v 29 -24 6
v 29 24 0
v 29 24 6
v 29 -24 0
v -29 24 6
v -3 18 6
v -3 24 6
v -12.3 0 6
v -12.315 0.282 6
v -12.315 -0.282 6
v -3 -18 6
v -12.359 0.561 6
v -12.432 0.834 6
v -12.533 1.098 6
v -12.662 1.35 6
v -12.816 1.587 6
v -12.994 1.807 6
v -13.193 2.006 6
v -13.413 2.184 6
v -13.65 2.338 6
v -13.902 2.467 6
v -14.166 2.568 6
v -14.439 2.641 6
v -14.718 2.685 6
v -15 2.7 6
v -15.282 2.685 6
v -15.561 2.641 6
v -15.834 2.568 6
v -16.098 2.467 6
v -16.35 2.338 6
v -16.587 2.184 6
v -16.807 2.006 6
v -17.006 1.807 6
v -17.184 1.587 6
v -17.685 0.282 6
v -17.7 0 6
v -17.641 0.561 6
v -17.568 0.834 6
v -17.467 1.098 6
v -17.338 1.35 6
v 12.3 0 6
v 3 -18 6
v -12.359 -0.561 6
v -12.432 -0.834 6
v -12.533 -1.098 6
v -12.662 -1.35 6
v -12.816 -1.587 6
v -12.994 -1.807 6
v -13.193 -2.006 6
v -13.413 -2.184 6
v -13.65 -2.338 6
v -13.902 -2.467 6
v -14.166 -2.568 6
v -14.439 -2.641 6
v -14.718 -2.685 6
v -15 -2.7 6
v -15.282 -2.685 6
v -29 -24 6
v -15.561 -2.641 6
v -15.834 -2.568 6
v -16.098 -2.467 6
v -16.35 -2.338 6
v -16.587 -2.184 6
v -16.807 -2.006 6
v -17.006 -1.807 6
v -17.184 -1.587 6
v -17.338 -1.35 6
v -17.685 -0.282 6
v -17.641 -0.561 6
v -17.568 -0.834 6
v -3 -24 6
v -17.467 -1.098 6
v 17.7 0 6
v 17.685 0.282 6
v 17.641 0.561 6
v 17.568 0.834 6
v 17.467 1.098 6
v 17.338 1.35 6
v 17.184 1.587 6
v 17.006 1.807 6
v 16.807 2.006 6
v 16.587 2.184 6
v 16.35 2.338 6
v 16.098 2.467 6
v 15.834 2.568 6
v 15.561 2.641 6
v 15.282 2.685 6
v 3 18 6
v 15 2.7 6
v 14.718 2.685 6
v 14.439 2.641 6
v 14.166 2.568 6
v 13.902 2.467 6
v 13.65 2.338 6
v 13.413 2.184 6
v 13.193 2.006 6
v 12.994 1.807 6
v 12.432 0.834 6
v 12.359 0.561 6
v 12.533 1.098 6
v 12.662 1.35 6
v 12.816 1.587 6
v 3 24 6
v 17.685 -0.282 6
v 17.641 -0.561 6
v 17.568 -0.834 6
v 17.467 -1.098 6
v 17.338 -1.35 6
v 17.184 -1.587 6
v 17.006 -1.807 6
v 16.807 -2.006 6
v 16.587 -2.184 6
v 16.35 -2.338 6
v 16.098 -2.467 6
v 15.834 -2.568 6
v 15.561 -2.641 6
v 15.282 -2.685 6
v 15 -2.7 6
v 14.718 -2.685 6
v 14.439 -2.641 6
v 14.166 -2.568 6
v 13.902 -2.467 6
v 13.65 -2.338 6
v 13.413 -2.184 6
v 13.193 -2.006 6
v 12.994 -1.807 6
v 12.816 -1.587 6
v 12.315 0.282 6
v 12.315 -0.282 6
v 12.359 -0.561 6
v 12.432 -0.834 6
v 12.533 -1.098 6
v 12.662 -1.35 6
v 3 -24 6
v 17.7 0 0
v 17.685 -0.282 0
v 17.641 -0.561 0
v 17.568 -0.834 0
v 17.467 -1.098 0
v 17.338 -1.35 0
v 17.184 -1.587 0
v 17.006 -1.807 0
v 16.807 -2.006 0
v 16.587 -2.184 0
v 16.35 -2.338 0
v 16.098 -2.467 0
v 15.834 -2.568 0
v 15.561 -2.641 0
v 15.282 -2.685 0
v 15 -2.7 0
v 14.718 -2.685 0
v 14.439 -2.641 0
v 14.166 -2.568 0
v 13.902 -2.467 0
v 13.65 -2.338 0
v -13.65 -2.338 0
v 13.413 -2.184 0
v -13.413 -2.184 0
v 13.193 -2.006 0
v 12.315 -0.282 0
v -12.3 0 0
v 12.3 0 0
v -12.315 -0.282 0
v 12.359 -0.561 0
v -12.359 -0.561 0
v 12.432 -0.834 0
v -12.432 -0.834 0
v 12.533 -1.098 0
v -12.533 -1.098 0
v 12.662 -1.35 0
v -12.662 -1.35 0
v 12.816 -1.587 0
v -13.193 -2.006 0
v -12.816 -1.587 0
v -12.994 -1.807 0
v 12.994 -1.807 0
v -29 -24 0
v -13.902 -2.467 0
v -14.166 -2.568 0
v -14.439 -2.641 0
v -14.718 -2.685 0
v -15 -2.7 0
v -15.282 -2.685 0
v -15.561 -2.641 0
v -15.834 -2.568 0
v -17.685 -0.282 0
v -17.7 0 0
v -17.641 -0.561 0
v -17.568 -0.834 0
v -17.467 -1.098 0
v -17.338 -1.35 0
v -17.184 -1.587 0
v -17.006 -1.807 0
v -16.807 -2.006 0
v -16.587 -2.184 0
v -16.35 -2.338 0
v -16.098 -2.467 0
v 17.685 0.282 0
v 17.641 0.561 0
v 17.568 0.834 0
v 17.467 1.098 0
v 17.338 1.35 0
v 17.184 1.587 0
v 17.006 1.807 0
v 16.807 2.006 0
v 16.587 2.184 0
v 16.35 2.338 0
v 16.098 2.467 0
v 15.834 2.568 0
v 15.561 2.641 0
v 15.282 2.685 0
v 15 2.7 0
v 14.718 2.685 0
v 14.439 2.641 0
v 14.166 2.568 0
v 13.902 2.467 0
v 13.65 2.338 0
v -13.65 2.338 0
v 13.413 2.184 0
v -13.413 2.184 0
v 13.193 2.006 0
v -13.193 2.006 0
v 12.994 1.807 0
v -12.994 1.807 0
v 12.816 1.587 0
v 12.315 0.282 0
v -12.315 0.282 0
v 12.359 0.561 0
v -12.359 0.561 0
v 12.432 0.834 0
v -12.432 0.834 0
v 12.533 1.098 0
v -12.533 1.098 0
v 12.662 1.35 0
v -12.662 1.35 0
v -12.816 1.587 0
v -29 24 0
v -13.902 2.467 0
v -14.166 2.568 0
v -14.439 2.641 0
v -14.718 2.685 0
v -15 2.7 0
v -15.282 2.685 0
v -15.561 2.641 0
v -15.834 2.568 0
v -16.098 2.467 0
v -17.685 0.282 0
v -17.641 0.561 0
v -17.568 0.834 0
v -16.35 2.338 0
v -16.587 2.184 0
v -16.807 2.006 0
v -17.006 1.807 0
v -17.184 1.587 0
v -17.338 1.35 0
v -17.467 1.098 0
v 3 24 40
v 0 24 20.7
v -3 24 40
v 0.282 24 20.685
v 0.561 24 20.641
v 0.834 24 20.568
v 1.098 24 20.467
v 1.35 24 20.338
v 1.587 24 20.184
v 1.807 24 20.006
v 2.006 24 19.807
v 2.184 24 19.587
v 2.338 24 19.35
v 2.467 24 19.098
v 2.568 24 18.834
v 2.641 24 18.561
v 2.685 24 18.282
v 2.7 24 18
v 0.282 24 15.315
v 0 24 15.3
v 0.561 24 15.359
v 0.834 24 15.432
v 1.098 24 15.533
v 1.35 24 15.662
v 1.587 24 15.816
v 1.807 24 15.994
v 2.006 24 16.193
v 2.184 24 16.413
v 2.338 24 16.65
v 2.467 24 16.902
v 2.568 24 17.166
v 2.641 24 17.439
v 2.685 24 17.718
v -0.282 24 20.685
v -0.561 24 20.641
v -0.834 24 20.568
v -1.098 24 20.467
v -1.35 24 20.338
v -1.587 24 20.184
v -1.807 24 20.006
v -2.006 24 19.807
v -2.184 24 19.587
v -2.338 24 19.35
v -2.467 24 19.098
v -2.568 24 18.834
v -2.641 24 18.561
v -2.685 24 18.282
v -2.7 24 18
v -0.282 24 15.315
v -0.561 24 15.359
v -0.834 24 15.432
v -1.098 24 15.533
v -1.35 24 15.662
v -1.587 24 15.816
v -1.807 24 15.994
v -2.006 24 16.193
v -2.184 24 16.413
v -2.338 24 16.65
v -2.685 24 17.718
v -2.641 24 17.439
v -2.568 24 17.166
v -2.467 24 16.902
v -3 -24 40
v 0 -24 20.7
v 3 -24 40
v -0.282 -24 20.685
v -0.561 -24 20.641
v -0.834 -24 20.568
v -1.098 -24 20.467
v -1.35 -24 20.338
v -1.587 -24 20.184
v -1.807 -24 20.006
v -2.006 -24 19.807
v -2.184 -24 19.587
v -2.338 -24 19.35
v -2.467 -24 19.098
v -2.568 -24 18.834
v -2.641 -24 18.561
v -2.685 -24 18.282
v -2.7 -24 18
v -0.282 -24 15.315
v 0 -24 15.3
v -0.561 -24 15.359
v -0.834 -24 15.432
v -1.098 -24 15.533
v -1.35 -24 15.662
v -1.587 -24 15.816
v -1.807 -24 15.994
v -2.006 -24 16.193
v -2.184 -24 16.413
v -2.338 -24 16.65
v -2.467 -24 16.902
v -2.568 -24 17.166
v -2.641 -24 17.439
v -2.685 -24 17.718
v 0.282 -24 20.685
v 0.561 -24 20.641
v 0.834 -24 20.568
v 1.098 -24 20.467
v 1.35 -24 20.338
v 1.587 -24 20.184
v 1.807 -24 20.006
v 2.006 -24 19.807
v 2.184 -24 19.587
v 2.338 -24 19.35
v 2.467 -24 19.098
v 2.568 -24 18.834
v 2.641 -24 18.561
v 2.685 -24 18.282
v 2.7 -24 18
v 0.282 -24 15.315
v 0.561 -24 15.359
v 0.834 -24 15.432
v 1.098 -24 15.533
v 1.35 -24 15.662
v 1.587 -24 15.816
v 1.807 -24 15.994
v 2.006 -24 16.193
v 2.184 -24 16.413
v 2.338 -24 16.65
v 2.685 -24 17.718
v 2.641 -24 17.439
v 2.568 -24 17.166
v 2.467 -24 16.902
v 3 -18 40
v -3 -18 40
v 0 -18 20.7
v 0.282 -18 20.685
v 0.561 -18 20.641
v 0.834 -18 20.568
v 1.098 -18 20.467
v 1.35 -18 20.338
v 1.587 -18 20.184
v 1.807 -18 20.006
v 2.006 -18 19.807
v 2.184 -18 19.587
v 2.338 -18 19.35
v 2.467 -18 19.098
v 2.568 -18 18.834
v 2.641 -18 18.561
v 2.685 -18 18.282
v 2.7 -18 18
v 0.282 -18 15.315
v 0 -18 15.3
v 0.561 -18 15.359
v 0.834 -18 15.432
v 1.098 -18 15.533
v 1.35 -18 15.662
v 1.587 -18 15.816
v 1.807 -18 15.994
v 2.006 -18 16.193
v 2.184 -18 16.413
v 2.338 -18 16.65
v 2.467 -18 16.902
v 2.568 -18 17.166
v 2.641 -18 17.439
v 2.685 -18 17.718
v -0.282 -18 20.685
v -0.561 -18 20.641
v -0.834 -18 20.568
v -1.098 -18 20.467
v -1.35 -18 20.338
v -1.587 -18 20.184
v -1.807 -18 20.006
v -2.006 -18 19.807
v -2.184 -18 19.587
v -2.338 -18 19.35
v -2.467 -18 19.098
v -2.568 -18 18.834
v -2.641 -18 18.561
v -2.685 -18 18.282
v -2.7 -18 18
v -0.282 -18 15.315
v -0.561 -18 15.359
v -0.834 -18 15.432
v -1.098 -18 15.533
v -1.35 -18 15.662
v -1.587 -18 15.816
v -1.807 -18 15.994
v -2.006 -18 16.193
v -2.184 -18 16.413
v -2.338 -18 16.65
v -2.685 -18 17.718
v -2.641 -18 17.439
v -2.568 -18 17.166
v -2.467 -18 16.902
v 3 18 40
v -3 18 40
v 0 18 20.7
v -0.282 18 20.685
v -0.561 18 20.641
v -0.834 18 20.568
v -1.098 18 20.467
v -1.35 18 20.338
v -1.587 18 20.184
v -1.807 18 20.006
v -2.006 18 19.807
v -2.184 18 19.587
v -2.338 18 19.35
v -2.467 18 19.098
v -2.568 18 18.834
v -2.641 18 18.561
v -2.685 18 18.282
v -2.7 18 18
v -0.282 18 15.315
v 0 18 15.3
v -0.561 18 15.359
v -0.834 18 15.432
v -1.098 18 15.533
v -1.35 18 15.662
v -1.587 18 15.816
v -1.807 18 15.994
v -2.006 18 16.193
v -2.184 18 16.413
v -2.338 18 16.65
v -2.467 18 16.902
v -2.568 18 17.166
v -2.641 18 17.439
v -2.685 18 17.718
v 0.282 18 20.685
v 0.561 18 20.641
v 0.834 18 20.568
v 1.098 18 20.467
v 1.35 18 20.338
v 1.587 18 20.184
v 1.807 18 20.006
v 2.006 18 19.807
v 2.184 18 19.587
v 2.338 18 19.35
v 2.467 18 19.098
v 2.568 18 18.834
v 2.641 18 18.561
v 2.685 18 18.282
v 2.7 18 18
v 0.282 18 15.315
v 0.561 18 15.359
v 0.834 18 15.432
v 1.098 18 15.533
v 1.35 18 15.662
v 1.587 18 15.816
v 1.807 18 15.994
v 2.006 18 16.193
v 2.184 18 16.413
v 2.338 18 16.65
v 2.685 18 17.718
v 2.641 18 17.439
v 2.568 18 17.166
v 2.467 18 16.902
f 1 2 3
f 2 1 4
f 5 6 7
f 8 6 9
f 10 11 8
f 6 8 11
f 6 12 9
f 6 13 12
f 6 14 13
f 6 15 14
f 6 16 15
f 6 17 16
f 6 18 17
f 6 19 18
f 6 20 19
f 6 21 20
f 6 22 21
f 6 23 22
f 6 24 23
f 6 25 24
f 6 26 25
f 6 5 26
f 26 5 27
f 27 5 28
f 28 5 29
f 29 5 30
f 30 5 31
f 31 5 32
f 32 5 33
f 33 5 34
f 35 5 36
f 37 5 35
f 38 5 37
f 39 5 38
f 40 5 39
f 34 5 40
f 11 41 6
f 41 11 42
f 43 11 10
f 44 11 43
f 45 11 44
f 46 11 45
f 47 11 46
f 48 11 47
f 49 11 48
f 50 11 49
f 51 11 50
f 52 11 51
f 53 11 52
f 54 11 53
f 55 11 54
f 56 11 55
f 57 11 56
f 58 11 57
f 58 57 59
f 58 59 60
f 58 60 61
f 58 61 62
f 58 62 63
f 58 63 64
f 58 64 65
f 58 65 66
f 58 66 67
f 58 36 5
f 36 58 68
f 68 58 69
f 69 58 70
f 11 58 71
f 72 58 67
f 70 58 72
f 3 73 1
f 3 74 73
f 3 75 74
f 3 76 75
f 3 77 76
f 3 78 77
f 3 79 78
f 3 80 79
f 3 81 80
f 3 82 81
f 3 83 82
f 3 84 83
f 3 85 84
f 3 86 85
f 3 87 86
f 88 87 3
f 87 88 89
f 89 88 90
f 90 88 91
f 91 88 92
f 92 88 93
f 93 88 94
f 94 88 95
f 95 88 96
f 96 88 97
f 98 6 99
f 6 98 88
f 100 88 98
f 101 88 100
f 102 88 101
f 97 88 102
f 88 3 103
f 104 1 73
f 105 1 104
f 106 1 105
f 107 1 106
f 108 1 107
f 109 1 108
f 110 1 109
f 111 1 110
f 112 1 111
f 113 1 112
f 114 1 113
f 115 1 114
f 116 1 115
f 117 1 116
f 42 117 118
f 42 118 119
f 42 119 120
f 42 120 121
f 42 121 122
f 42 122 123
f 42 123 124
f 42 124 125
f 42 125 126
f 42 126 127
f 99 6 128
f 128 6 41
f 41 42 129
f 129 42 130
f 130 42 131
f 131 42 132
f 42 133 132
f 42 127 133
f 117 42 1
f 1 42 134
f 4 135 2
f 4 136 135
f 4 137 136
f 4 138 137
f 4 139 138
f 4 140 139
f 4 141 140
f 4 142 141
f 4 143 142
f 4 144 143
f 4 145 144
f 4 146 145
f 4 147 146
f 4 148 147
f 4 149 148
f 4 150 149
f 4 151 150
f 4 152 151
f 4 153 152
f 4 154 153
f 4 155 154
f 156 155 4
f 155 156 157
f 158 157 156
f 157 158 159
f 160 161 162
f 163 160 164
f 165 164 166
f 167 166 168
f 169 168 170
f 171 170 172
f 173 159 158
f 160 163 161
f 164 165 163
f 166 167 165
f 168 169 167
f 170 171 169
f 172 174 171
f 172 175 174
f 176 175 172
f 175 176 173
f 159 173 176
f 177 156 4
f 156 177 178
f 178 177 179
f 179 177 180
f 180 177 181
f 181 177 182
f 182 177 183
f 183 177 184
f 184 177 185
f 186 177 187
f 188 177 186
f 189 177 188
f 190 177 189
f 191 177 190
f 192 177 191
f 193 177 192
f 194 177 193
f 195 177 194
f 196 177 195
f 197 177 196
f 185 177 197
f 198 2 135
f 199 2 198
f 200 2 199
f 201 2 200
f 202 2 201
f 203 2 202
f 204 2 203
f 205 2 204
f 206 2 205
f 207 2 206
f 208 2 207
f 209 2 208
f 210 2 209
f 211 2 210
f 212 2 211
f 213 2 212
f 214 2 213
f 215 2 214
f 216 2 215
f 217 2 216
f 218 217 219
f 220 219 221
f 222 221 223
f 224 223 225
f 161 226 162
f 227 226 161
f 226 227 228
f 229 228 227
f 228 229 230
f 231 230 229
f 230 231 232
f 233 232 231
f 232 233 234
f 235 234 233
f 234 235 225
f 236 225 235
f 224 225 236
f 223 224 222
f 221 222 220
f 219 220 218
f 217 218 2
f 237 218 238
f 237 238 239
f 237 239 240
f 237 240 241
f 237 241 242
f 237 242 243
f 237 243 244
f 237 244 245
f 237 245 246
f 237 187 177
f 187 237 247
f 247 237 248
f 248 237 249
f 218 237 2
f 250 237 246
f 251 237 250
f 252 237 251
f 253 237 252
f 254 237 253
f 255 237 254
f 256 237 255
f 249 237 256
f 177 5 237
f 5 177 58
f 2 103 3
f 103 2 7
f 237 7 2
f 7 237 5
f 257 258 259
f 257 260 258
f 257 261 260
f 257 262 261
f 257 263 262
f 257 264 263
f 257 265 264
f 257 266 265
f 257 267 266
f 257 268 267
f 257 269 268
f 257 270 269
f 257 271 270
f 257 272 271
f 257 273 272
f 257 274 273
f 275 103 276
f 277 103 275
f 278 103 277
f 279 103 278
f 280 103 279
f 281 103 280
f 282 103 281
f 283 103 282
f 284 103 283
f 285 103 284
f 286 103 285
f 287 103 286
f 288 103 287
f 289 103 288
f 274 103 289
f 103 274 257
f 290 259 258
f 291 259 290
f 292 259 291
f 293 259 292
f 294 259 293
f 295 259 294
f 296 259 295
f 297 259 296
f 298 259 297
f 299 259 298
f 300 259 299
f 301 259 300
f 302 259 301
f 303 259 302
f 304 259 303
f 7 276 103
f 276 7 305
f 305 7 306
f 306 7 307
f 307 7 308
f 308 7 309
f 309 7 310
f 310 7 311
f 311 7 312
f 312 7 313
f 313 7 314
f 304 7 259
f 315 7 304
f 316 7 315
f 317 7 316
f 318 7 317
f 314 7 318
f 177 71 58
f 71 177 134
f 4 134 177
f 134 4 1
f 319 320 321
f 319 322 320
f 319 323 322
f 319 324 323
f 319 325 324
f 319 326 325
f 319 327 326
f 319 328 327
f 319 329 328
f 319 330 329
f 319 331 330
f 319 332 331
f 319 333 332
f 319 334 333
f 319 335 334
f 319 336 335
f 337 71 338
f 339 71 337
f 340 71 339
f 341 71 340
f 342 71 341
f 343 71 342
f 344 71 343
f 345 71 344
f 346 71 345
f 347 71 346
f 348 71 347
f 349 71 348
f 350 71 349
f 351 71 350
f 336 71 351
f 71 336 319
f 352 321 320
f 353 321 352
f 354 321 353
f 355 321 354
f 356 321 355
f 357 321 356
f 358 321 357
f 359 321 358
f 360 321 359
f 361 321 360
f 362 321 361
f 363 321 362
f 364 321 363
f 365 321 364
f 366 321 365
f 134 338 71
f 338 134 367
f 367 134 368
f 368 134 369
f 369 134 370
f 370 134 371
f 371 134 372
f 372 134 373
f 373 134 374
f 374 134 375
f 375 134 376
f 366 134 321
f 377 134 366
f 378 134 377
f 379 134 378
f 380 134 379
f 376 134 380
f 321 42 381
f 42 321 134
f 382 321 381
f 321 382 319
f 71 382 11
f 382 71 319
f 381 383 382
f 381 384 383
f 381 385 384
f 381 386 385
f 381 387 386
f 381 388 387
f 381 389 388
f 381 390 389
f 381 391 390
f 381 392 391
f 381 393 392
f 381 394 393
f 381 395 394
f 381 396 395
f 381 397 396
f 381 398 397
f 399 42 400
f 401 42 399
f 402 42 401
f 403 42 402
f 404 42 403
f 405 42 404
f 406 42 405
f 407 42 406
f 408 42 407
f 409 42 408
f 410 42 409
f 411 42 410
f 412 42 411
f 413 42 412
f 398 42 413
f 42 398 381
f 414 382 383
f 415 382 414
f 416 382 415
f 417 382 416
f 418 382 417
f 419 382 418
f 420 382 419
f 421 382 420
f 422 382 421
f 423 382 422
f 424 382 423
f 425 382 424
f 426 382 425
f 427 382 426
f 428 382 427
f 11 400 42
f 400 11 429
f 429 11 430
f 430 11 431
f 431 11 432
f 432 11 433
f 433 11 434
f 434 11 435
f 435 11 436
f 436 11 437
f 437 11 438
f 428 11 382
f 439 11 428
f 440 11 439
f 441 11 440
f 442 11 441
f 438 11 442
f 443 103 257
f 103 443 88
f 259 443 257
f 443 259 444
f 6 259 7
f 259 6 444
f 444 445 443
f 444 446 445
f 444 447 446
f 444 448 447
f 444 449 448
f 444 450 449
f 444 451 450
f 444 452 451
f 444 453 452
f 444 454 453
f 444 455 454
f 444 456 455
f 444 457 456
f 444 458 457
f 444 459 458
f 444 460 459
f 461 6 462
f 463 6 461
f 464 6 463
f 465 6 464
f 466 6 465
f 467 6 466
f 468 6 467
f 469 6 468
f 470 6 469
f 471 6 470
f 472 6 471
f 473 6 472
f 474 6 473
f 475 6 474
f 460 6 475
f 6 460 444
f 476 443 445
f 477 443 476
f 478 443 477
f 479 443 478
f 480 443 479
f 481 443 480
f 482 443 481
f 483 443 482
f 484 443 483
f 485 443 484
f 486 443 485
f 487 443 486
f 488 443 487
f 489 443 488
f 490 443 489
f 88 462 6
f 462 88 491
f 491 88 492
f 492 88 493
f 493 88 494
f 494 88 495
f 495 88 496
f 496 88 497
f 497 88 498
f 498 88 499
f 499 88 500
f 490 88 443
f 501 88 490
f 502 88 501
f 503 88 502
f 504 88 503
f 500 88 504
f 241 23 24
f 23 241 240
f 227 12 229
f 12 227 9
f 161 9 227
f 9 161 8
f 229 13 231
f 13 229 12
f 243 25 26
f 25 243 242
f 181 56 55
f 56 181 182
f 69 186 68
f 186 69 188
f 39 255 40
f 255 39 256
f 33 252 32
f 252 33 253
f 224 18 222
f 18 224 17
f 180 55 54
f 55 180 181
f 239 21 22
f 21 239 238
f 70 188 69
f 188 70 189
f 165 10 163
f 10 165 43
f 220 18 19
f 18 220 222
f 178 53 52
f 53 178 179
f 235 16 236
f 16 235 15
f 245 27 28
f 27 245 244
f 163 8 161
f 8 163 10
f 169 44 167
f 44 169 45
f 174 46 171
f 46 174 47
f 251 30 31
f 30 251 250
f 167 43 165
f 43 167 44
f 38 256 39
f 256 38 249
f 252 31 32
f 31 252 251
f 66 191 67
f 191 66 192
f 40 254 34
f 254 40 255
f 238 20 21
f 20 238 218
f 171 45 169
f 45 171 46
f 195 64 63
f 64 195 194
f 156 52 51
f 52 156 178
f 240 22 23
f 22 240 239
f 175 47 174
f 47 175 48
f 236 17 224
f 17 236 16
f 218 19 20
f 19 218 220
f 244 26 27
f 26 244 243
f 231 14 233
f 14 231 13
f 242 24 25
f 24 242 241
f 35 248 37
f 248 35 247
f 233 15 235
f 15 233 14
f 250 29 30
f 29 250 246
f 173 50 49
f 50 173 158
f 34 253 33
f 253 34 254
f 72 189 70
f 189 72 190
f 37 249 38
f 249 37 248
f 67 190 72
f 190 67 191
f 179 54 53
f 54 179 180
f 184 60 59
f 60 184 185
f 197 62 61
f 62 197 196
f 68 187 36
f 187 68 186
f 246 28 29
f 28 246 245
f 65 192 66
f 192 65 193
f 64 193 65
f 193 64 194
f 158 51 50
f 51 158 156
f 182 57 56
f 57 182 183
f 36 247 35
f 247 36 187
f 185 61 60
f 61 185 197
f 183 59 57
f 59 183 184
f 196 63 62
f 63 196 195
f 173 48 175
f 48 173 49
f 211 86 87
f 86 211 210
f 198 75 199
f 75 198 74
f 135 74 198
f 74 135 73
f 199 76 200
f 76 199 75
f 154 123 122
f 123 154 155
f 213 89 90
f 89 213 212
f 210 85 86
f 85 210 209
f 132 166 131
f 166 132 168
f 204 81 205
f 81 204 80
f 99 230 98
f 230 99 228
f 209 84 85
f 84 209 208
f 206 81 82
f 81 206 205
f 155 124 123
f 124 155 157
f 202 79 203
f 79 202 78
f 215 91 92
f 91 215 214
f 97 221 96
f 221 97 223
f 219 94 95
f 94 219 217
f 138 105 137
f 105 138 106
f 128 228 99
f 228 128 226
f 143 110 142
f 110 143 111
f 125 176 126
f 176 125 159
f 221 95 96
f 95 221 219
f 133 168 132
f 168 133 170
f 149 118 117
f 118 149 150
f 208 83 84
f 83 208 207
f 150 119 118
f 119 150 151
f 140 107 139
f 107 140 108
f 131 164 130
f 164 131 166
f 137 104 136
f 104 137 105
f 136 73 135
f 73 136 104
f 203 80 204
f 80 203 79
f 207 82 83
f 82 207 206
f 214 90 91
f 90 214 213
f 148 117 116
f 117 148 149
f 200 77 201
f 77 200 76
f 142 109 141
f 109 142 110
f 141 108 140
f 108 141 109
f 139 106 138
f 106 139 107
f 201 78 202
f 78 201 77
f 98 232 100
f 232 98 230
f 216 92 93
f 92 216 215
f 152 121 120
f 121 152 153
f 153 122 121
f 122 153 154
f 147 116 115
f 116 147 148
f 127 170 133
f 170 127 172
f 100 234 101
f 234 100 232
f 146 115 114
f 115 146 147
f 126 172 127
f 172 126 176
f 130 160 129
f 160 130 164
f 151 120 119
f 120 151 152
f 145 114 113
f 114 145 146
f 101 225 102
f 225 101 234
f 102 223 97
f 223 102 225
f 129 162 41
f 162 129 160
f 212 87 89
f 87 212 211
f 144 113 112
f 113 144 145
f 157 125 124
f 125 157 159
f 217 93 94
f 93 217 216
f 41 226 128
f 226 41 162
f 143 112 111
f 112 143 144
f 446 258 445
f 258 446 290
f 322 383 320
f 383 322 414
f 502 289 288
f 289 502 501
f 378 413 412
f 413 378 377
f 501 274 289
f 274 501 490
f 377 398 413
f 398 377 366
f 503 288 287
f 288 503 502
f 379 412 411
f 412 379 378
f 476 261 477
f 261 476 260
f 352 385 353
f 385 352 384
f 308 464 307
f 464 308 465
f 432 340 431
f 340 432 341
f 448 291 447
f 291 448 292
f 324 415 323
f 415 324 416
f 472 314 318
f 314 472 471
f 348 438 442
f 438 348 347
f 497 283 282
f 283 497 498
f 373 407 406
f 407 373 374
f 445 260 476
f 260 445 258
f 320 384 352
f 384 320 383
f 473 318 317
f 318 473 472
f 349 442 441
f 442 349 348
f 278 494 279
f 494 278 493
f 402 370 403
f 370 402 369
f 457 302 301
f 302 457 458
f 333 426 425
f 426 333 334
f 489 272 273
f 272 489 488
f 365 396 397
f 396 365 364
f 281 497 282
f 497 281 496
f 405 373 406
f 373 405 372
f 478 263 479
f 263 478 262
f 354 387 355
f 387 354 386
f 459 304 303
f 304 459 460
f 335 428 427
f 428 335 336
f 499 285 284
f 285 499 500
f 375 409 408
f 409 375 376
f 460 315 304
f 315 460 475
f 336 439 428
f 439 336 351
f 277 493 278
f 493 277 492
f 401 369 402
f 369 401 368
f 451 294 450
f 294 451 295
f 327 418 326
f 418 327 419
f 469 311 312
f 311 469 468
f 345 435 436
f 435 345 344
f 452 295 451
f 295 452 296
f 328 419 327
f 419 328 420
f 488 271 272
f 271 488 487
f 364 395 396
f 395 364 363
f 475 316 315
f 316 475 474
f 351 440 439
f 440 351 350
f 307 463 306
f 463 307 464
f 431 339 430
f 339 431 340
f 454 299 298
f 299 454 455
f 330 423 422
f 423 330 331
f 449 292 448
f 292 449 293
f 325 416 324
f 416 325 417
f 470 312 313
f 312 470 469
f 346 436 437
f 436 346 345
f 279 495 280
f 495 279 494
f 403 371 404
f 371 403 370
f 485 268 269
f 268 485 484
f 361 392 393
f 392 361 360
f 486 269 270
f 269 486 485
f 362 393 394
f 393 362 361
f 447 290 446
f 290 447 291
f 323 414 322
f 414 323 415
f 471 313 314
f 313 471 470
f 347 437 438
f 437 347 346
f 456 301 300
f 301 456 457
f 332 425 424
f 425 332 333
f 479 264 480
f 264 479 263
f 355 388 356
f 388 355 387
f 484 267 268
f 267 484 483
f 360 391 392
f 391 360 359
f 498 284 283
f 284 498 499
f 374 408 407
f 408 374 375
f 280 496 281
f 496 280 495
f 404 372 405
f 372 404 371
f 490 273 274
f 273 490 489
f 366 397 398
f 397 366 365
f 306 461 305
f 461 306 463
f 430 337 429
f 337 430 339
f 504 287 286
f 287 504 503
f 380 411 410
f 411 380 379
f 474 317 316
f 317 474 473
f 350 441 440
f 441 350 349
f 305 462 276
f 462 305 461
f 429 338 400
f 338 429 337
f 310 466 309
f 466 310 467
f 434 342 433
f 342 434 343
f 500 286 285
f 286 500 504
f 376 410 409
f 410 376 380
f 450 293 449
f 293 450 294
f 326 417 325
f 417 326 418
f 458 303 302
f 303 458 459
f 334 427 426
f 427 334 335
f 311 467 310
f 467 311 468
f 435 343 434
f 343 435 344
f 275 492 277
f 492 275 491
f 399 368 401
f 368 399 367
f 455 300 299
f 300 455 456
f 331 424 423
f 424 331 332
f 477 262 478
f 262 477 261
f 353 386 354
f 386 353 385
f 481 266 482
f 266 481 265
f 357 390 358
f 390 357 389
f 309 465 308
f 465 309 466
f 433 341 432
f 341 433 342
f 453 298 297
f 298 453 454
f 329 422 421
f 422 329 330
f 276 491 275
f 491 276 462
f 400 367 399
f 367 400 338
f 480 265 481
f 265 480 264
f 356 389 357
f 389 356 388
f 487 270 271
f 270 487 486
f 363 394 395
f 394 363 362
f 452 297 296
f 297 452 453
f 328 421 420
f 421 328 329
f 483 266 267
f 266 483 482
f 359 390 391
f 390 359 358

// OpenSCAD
// Clevis mounting bracket for M5 pin.
$fn = 60;
eps = 0.02;
opening = 36;
ear_h = 36;
base_l = 58;
base_w = opening + 12;
base_t = 6;
ear_t = 6;
difference() {
    union() {
        translate([-base_l / 2, -base_w / 2, 0]) cube([base_l, base_w, base_t]);
        translate([-ear_t / 2, -base_w / 2, base_t - 2]) cube([ear_t, ear_t, ear_h]);
        translate([-ear_t / 2, base_w / 2 - ear_t, base_t - 2]) cube([ear_t, ear_t, ear_h]);
    }
    for (x = [-15, 15]) translate([x, 0, -eps]) cylinder(d = 5.4, h = base_t + 2 * eps);
    translate([0, -base_w / 2 - eps, ear_h / 2]) rotate([-90, 0, 0]) cylinder(d = 5.4, h = base_w + 2 * eps);
}
